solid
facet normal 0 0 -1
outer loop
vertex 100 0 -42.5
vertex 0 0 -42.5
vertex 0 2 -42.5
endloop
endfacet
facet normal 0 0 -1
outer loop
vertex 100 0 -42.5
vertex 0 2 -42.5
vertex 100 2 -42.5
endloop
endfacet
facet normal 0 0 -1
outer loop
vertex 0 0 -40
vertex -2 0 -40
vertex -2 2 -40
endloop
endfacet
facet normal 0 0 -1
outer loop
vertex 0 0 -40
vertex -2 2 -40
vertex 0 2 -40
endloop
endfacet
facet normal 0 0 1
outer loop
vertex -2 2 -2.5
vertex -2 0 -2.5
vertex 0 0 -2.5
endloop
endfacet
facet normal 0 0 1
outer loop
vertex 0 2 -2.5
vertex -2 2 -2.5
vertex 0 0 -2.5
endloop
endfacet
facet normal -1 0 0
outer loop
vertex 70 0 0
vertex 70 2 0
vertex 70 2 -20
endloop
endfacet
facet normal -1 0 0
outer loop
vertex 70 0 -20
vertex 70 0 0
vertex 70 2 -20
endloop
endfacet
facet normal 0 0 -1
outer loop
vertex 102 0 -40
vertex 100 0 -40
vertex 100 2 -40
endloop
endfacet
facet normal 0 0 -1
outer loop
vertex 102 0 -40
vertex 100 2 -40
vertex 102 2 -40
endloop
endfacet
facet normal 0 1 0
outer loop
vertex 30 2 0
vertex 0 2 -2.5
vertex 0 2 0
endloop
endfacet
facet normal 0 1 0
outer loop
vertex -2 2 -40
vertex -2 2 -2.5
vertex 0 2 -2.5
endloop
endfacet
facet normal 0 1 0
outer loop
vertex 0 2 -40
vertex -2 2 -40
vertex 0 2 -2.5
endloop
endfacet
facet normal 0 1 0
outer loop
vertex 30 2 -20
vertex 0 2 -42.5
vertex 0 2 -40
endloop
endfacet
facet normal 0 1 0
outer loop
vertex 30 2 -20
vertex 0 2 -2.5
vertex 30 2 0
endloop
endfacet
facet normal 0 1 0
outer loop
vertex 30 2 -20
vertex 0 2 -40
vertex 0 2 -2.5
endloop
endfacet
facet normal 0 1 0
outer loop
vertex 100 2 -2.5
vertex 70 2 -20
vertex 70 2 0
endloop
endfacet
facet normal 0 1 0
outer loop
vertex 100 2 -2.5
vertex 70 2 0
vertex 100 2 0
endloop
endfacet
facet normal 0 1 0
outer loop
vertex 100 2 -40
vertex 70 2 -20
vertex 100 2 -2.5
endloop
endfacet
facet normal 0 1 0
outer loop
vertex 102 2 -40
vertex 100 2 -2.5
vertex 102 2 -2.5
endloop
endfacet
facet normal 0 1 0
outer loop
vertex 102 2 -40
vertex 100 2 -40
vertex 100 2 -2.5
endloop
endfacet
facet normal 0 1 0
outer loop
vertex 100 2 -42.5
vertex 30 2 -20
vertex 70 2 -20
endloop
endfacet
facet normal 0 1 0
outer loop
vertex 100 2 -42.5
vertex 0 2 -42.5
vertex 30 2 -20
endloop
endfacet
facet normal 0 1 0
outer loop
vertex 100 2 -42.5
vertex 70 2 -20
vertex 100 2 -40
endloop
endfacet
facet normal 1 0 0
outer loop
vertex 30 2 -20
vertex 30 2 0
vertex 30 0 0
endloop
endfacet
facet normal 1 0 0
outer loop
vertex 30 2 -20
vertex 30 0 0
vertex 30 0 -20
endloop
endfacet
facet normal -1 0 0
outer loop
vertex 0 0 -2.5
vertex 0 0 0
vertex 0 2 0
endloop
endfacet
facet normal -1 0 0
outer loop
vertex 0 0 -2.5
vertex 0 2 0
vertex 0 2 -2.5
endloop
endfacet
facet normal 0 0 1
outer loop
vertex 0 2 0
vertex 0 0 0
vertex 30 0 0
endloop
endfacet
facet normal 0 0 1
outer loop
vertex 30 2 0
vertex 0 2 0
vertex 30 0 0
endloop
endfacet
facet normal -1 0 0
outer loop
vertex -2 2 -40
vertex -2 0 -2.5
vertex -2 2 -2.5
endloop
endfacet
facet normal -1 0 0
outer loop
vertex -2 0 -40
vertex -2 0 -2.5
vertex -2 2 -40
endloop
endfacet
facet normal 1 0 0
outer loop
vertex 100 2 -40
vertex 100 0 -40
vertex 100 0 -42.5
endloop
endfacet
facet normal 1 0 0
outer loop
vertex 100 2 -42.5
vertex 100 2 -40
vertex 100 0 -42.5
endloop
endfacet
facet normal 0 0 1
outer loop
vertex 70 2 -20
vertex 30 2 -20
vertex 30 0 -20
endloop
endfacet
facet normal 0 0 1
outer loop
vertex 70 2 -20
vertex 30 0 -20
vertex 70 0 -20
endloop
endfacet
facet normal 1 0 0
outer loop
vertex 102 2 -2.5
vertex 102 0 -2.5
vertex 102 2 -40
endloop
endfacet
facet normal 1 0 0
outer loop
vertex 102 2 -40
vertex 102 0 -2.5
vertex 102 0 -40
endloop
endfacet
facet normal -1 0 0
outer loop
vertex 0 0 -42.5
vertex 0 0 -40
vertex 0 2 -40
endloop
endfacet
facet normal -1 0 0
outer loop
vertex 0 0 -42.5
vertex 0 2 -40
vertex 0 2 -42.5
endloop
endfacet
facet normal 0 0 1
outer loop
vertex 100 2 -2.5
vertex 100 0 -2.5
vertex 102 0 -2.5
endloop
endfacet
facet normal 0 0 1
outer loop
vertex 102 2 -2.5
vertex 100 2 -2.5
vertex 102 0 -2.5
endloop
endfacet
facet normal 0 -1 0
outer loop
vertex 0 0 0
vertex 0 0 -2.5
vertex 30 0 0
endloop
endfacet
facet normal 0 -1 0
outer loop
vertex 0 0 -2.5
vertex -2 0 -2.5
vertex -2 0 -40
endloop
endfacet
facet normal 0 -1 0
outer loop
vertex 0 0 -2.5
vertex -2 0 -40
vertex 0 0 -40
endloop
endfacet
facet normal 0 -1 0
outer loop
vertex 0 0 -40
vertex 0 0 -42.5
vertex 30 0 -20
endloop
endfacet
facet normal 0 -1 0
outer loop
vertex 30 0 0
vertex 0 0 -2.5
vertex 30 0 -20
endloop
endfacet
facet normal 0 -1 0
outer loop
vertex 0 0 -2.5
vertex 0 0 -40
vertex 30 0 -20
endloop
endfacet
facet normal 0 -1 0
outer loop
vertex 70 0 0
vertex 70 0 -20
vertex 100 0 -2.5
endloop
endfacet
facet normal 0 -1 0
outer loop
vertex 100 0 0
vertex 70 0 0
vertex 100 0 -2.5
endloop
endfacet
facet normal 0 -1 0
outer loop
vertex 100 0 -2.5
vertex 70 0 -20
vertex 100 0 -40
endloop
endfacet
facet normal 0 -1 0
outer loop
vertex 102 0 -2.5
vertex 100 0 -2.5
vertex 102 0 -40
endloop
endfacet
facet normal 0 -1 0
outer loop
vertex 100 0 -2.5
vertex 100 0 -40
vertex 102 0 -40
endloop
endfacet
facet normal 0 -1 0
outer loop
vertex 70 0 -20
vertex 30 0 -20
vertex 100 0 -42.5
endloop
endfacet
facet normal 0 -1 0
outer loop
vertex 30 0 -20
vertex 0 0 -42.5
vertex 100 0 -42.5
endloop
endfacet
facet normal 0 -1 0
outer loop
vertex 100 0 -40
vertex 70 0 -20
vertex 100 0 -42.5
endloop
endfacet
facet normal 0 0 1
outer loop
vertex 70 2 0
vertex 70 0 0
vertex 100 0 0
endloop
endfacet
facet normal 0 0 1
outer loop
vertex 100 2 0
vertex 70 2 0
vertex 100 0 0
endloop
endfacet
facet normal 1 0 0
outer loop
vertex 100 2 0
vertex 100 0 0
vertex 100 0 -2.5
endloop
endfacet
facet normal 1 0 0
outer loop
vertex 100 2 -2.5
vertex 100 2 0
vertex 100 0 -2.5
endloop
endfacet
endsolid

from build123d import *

# Parameters (mm, degrees)
SKETCH_1_W          = 2
SKETCH_1_H          = 37.5
SKETCH_1_W_2        = 100
SKETCH_1_H_2        = 42.5
EXTRUDE_1_DEPTH     = 2
CUT_EXTRUDE_1_REACH = 112.518
SKETCH_2_W          = 40
SKETCH_2_H          = 20


with BuildPart() as part:
    # 草图1 → 凸台-拉伸1 (new body)
    with BuildSketch(Plane(origin=(0, 0, 0), x_dir=(1, 0, 0), z_dir=(0, 1, 0))):
        with Locations((-1, 21.25)):
            Rectangle(SKETCH_1_W, SKETCH_1_H)
        with Locations((50, 21.25)):
            Rectangle(SKETCH_1_W_2, SKETCH_1_H_2)
        with Locations((101, 21.25)):
            Rectangle(SKETCH_1_W, SKETCH_1_H)
    extrude(amount=EXTRUDE_1_DEPTH)

    # 草图2 → 切除-拉伸1 (cut, up to next)
    with BuildSketch(Plane(origin=(0, 2, 0), x_dir=(1, 0, 0), z_dir=(0, 1, 0)), mode=Mode.PRIVATE) as cut_extrude_1_sk1:
        with Locations((50, 10)):
            Rectangle(SKETCH_2_W, SKETCH_2_H)
    cut_extrude_1_tool1 = extrude(cut_extrude_1_sk1.sketch, amount=-CUT_EXTRUDE_1_REACH, mode=Mode.PRIVATE) & part.part
    add(cut_extrude_1_tool1.solids().sort_by_distance((50, 2, -10))[0], mode=Mode.SUBTRACT)


solid = part.part
